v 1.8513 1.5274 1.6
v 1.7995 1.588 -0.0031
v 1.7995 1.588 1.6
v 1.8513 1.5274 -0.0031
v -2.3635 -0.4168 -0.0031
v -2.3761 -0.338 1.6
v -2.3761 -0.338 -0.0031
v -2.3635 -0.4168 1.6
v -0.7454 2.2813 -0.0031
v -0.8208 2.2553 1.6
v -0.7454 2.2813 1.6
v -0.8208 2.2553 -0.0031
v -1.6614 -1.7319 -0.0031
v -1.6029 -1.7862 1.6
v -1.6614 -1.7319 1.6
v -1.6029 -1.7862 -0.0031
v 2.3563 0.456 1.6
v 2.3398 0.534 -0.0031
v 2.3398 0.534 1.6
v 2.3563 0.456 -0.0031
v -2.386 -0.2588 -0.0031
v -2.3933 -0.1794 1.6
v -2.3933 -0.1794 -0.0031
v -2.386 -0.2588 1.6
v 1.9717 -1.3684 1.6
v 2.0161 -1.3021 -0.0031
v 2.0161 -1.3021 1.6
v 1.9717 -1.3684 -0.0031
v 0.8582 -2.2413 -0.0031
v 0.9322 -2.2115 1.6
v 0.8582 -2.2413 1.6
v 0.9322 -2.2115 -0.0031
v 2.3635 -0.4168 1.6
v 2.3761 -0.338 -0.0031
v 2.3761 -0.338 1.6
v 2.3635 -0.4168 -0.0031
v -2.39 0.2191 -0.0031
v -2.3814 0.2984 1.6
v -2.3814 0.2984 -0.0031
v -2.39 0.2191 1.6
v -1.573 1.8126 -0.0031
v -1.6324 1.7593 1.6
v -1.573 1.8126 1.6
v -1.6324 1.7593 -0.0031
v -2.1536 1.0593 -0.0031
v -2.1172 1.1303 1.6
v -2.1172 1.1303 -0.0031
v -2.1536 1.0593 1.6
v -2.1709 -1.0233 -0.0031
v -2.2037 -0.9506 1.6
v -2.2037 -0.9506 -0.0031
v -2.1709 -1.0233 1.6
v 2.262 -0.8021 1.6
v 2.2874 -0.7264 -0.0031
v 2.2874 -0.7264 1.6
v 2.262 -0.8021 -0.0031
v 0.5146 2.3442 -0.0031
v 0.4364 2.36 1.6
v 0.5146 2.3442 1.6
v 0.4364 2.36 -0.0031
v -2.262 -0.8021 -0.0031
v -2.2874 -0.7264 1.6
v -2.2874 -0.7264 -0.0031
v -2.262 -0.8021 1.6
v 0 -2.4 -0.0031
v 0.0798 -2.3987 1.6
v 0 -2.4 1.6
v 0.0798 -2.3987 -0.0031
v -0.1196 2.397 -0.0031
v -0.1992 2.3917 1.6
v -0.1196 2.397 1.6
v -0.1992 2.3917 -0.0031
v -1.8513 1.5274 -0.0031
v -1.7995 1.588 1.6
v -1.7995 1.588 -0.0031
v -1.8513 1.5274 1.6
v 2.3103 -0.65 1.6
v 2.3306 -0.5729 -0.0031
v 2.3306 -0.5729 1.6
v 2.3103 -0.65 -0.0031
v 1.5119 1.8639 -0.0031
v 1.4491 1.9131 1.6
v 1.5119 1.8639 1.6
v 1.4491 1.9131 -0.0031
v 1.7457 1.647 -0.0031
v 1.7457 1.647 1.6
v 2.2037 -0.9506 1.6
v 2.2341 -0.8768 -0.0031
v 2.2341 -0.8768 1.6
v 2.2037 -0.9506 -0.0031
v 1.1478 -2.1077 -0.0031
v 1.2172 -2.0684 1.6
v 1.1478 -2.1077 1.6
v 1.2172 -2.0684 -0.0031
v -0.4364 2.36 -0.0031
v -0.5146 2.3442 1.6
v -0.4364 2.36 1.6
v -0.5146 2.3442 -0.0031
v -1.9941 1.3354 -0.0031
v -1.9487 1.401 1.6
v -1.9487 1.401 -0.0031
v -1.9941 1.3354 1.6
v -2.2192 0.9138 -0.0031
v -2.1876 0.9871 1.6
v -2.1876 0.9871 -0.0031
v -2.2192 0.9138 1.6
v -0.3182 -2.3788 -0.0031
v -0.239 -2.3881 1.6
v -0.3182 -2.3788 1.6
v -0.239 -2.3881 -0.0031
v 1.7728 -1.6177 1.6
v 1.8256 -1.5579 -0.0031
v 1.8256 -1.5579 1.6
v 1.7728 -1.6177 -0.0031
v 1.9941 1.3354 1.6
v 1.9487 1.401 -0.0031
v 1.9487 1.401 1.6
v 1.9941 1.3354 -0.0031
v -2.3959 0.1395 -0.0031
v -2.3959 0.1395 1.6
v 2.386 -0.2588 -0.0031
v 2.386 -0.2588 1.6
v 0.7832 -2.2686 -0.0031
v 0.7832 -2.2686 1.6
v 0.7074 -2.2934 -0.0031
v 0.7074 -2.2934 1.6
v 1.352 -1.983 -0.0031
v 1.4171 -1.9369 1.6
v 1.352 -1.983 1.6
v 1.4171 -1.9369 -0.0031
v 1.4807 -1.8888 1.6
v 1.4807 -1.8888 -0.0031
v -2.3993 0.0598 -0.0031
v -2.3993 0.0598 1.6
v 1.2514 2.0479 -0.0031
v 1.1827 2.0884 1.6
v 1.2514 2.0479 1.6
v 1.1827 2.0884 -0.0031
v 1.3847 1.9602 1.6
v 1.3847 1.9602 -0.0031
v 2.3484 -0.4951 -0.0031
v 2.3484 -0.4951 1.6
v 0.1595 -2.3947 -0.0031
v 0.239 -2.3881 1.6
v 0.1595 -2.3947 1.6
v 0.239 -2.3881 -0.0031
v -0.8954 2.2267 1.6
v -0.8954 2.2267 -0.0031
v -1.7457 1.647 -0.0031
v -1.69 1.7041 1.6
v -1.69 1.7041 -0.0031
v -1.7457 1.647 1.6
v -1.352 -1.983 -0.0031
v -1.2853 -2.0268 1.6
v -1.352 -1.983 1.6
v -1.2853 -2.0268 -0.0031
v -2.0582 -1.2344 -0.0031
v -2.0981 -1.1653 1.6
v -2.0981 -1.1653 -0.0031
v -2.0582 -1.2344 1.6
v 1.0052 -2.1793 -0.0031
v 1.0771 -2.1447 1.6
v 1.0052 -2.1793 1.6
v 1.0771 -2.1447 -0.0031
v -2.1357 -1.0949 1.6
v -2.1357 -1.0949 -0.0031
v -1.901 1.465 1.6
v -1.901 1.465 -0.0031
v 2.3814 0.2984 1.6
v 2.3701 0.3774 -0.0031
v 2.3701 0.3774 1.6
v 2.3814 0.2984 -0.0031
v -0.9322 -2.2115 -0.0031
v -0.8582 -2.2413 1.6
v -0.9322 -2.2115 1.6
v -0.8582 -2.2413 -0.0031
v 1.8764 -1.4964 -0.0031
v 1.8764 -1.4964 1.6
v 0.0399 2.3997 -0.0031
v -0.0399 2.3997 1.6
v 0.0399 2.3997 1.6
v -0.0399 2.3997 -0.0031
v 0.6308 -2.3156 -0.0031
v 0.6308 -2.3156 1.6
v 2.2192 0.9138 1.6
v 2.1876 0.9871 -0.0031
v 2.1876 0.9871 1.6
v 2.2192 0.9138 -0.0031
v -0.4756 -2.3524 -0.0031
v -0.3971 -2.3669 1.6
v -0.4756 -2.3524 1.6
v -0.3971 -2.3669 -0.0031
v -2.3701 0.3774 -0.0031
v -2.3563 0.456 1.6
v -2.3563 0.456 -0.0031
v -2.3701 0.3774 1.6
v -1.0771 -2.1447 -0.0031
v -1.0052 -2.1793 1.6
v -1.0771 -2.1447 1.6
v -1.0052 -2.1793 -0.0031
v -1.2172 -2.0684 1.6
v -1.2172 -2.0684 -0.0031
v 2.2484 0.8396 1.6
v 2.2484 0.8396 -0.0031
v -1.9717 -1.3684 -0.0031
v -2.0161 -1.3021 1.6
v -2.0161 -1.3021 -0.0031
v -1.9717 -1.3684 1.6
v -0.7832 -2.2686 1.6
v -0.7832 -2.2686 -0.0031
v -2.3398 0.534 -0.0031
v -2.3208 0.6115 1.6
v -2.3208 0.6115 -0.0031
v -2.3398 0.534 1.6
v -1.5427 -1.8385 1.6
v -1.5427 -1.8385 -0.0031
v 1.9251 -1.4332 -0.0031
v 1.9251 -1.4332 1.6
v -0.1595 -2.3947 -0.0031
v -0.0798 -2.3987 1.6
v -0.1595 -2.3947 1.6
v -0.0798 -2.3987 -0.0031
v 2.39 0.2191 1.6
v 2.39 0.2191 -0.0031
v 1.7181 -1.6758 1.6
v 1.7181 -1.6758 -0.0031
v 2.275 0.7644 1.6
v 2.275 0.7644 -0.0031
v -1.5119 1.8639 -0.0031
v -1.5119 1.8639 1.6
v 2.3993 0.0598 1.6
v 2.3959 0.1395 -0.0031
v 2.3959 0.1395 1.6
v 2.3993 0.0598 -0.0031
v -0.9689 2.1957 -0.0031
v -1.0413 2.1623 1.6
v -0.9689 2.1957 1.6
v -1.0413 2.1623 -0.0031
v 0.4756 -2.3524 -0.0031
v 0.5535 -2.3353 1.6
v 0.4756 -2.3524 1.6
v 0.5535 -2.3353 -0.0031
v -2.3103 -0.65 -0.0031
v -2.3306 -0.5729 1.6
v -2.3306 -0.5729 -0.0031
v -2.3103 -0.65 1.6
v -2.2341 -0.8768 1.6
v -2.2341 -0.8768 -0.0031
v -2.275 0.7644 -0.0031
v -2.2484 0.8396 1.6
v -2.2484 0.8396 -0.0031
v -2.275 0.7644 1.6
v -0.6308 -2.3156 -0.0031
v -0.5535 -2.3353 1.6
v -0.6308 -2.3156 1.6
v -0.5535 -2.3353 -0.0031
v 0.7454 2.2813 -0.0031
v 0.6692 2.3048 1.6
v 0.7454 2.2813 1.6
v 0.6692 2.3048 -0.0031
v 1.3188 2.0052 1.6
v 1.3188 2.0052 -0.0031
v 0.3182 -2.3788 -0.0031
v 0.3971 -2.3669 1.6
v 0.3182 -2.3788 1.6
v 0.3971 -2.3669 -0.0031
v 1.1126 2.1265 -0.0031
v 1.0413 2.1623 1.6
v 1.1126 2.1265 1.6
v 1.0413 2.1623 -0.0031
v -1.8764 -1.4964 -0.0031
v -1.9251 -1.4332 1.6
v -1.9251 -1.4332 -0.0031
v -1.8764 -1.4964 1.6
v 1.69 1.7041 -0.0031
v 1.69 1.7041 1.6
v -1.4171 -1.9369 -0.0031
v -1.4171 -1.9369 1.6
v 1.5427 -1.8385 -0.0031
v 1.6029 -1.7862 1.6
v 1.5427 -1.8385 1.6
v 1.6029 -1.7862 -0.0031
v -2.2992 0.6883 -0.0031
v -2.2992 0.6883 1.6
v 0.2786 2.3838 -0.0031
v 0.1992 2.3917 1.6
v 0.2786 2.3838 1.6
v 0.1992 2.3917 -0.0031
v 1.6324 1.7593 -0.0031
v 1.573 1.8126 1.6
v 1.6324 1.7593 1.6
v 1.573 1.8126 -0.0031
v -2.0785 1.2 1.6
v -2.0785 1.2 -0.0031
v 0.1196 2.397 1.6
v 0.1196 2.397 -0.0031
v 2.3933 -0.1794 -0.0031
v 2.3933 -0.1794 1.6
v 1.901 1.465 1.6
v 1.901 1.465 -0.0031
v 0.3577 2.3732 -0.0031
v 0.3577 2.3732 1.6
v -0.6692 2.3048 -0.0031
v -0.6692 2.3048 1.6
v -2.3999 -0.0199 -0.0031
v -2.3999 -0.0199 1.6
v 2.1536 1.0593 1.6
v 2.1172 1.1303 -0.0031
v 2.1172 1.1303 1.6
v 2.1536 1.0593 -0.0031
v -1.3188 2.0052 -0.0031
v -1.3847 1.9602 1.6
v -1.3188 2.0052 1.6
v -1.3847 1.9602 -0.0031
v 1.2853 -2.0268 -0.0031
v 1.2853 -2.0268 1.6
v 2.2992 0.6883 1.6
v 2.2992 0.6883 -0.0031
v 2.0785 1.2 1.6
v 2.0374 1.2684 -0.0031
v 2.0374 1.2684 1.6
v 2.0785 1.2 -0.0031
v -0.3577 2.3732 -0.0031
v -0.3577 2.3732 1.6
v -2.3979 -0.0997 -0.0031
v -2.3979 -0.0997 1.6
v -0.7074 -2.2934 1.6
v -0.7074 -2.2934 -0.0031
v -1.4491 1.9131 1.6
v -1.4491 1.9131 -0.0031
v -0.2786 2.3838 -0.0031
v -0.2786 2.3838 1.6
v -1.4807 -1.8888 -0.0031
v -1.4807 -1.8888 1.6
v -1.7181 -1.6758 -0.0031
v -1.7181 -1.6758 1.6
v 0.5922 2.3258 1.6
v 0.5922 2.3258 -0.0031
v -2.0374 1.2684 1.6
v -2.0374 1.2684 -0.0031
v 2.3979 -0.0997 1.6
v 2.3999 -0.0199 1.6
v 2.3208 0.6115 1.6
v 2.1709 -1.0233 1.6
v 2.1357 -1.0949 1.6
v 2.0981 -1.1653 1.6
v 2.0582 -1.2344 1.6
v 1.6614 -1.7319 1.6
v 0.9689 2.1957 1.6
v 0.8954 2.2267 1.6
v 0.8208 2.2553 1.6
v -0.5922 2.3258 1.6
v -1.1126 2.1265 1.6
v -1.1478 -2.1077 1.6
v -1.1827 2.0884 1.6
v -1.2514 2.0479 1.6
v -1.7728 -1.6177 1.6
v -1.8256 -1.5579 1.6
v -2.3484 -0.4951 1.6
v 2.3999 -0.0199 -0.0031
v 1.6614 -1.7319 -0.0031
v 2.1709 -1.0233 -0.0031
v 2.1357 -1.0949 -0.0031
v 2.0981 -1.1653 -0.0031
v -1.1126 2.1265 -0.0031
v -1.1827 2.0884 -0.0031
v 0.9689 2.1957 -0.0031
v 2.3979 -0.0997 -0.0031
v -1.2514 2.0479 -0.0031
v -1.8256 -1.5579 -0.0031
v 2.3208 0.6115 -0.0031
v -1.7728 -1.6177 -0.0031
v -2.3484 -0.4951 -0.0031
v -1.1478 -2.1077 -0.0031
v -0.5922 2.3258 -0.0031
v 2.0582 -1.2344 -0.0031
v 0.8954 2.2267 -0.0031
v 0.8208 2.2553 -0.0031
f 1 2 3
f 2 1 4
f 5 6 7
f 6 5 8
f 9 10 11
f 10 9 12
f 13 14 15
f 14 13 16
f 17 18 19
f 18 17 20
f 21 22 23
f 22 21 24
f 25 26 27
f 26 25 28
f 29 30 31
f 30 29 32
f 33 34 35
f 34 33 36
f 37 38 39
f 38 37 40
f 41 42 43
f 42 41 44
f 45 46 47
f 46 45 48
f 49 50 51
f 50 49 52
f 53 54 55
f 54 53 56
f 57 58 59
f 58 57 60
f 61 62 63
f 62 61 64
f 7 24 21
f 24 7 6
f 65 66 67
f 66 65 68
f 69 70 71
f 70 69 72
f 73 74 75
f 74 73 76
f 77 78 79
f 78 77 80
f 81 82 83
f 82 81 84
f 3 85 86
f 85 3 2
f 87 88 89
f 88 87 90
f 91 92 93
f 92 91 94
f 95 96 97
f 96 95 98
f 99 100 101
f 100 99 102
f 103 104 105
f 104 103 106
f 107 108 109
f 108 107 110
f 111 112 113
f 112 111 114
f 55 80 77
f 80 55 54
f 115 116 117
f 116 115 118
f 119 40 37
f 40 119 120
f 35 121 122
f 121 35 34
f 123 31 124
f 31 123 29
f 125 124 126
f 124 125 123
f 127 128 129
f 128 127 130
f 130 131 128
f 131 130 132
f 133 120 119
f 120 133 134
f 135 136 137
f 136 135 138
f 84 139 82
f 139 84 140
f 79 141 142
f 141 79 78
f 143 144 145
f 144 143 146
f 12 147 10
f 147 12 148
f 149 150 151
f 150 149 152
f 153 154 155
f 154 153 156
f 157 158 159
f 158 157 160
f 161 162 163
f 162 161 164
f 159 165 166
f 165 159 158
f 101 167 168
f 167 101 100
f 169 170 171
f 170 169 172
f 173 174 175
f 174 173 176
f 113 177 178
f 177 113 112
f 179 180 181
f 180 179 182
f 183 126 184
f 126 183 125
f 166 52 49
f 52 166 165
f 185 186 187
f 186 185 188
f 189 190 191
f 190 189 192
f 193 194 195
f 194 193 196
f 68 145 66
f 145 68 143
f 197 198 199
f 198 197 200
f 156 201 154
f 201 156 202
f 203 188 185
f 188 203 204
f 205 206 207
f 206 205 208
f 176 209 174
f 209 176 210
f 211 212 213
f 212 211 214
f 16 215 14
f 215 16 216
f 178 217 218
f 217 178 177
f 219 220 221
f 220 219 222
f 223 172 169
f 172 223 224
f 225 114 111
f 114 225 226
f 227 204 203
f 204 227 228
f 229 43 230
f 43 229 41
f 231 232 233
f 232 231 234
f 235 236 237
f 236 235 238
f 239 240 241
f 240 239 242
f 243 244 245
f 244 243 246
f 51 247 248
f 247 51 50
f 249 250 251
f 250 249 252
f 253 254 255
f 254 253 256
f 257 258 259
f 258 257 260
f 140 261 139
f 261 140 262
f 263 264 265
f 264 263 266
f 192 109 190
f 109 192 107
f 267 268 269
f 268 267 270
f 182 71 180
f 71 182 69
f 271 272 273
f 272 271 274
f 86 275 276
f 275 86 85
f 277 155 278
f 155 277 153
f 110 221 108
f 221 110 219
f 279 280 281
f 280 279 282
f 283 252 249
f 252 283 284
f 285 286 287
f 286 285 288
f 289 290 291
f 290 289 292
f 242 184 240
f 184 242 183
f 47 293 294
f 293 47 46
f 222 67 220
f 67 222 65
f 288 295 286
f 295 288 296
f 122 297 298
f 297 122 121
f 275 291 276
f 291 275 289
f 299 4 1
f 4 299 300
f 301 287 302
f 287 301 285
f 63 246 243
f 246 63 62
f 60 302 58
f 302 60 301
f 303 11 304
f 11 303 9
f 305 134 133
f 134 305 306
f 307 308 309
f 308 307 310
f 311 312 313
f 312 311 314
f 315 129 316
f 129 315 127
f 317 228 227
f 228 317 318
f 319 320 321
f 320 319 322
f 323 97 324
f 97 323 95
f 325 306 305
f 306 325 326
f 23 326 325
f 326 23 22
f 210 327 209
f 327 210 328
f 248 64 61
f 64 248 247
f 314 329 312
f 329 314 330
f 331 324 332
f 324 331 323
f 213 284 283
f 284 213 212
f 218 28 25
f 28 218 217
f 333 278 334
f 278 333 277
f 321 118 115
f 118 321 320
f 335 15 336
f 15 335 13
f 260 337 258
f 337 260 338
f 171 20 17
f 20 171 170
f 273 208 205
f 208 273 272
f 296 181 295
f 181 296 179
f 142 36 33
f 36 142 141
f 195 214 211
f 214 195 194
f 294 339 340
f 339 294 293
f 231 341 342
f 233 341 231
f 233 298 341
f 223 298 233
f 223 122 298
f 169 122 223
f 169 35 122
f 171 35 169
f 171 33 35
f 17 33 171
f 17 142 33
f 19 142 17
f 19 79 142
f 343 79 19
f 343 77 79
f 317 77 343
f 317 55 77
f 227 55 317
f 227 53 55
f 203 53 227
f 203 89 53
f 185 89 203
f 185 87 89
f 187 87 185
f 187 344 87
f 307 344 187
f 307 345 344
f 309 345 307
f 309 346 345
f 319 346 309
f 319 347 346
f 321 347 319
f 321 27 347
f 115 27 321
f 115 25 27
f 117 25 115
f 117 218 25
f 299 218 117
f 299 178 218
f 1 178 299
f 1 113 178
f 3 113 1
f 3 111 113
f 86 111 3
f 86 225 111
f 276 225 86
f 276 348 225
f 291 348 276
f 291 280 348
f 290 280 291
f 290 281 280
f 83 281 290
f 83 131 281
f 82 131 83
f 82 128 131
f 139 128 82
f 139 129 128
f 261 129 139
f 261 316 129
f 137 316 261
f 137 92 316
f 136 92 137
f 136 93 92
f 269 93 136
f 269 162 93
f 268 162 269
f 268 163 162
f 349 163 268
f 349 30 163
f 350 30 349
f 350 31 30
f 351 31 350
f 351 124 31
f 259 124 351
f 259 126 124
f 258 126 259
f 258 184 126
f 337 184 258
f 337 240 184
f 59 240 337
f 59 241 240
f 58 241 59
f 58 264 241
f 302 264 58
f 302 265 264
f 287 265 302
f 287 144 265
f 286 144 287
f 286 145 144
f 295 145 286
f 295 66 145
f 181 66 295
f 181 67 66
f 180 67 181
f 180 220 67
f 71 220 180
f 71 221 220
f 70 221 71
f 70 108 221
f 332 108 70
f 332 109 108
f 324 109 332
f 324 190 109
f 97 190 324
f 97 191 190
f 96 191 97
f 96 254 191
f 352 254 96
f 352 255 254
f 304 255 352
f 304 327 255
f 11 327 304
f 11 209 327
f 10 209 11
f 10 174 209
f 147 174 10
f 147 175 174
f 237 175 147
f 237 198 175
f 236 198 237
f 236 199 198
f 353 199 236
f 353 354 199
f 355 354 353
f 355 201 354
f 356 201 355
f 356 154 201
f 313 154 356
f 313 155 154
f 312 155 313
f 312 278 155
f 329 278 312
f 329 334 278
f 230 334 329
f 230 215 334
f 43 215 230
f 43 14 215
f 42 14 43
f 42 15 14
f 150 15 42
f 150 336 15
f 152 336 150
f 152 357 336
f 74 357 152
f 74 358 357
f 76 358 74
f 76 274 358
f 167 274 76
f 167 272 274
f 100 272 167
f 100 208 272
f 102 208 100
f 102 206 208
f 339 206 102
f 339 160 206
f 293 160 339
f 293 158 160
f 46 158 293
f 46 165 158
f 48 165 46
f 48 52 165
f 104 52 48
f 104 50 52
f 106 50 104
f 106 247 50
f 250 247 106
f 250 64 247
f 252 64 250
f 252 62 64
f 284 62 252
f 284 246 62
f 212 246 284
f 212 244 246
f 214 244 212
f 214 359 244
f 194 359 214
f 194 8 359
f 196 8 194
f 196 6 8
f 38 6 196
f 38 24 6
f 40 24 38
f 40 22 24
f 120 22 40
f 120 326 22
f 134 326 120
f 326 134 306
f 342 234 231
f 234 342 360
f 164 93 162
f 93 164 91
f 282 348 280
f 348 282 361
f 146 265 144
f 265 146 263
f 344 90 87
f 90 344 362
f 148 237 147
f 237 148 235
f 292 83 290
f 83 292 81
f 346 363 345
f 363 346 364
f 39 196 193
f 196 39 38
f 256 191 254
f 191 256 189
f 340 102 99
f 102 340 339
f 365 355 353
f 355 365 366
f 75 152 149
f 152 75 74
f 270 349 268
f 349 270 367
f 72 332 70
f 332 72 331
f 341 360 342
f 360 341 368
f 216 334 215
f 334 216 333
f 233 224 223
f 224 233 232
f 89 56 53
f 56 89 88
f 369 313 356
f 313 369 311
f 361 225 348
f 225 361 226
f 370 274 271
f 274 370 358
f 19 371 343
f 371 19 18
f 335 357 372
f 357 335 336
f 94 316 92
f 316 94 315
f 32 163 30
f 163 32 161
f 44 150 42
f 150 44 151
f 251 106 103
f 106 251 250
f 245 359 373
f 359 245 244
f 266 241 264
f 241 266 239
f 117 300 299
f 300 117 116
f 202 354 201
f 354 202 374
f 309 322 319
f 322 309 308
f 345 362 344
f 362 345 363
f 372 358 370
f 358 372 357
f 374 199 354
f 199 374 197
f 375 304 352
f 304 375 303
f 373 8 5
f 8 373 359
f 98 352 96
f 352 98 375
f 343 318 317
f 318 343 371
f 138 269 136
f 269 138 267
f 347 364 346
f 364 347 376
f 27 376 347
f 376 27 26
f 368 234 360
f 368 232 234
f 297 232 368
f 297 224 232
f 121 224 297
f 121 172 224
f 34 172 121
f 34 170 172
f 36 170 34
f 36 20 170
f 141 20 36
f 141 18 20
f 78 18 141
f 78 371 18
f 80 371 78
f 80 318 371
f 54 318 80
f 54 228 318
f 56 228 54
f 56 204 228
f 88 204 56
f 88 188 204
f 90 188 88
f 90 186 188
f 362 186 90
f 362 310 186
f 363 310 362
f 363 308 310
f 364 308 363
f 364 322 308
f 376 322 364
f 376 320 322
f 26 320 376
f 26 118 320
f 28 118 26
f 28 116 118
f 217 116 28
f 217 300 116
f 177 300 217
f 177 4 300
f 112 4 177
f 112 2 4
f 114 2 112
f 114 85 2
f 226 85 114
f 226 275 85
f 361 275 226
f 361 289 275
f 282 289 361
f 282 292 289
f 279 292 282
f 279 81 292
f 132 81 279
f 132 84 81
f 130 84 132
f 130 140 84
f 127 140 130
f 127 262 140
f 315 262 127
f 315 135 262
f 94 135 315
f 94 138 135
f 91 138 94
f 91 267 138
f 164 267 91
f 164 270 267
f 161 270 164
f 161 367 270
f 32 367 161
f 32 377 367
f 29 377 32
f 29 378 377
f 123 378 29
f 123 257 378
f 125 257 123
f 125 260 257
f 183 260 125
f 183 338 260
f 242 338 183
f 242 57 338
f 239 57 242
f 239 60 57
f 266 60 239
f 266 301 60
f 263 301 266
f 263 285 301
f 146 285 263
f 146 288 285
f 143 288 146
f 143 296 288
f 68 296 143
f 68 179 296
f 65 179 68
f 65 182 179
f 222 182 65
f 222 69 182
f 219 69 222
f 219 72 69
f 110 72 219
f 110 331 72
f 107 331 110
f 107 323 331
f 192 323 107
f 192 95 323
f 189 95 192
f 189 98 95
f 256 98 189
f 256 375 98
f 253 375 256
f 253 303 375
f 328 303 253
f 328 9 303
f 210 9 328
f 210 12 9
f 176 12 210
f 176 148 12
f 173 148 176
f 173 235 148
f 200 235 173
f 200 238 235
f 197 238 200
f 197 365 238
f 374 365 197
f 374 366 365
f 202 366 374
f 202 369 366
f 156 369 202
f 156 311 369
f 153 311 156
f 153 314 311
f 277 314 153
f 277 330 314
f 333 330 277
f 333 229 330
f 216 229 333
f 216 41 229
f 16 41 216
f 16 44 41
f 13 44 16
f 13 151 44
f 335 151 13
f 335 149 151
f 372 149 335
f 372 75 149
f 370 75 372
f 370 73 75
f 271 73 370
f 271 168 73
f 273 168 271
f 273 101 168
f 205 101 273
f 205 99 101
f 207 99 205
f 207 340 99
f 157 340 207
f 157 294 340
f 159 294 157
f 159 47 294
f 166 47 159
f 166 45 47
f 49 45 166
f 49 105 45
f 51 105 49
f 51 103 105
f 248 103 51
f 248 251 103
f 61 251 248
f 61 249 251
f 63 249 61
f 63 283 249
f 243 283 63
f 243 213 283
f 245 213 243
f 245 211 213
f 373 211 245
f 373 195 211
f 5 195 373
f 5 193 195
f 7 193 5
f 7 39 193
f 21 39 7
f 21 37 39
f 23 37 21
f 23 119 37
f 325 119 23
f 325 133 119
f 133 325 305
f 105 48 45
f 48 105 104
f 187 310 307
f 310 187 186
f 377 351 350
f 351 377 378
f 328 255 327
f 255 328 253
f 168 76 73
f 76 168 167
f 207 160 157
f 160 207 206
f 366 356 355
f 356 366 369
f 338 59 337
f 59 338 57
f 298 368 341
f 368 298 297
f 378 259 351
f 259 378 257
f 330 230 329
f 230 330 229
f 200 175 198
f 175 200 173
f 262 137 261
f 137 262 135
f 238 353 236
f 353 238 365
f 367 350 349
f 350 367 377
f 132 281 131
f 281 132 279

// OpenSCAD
use <../lib.scad>
use <s/3040s01.scad>
$fa=1; $fs=0.2;
function ldraw_lib__3040p32(realsolid=false) = [
// 0 Slope Brick 45  2 x  1 with 9 + 3 Black Buttons Pattern
// 0 Name: 3040p32.dat
// 0 Author: Bram Lambrecht
// 0 !LDRAW_ORG Part UPDATE 2004-01
// 0 !LICENSE Licensed under CC BY 2.0 and CC BY 4.0 : see CAreadme.txt
// 
// 0 BFC CERTIFY CCW
  [0,"BFC","CERTIFY"],
  [0,"BFC","CCW"],
// 
// 0 !HISTORY 1999-02-01 [PTadmin] Official Update 1999-01
// 0 !HISTORY 2000-05-07 [PTadmin] Official Update 2000-01
// 0 !HISTORY 2000-09-30 [PTadmin] Official Update 2000-02
// 0 !HISTORY 2002-09-13 [izanette] Modified with WINDZ for BFC compliance
// 0 !HISTORY 2004-03-02 [PTadmin] Official Update 2004-01
// 0 !HISTORY 2007-06-09 [PTadmin] Header formatted for Contributor Agreement
// 0 !HISTORY 2008-07-01 [PTadmin] Official Update 2008-01
// 
// 
// 1 16 0 0 0 1 0 0 0 1 0 0 0 1 s\3040s01.dat
  [1,16,0,0,0,1,0,0,0,1,0,0,0,1, ldraw_lib__s__3040s01(realsolid)],
// 
// 4 0 -8 2.86 -12.86 -8 5.71 -15.71 -4 5.71 -15.71 -4 2.86 -12.86
  [4,0,-8,2.86,-12.86,-8,5.71,-15.71,-4,5.71,-15.71,-4,2.86,-12.86],
// 4 0 -2 2.86 -12.86 -2 5.71 -15.71 2 5.71 -15.71 2 2.86 -12.86
  [4,0,-2,2.86,-12.86,-2,5.71,-15.71,2,5.71,-15.71,2,2.86,-12.86],
// 4 0 4 2.86 -12.86 4 5.71 -15.71 8 5.71 -15.71 8 2.86 -12.86
  [4,0,4,2.86,-12.86,4,5.71,-15.71,8,5.71,-15.71,8,2.86,-12.86],
// 4 0 -8 7.14 -17.14 -8 10.00 -20.00 -4 10.00 -20.00 -4 7.14 -17.14
  [4,0,-8,7.14,-17.14,-8,10.00,-20.00,-4,10.00,-20.00,-4,7.14,-17.14],
// 4 0 -2 7.14 -17.14 -2 10.00 -20.00 2 10.00 -20.00 2 7.14 -17.14
  [4,0,-2,7.14,-17.14,-2,10.00,-20.00,2,10.00,-20.00,2,7.14,-17.14],
// 4 0 4 7.14 -17.14 4 10.00 -20.00 8 10.00 -20.00 8 7.14 -17.14
  [4,0,4,7.14,-17.14,4,10.00,-20.00,8,10.00,-20.00,8,7.14,-17.14],
// 4 0 -8 11.43 -21.43 -8 14.29 -24.29 -4 14.29 -24.29 -4 11.43 -21.43
  [4,0,-8,11.43,-21.43,-8,14.29,-24.29,-4,14.29,-24.29,-4,11.43,-21.43],
// 4 0 -2 11.43 -21.43 -2 14.29 -24.29 2 14.29 -24.29 2 11.43 -21.43
  [4,0,-2,11.43,-21.43,-2,14.29,-24.29,2,14.29,-24.29,2,11.43,-21.43],
// 4 0 4 11.43 -21.43 4 14.29 -24.29 8 14.29 -24.29 8 11.43 -21.43
  [4,0,4,11.43,-21.43,4,14.29,-24.29,8,14.29,-24.29,8,11.43,-21.43],
// 4 0 -8 16.43 -26.43 -8 17.86 -27.86 -4 17.86 -27.86 -4 16.43 -26.43
  [4,0,-8,16.43,-26.43,-8,17.86,-27.86,-4,17.86,-27.86,-4,16.43,-26.43],
// 4 0 -2 16.43 -26.43 -2 17.86 -27.86 2 17.86 -27.86 2 16.43 -26.43
  [4,0,-2,16.43,-26.43,-2,17.86,-27.86,2,17.86,-27.86,2,16.43,-26.43],
// 4 0 4 16.43 -26.43 4 17.86 -27.86 8 17.86 -27.86 8 16.43 -26.43
  [4,0,4,16.43,-26.43,4,17.86,-27.86,8,17.86,-27.86,8,16.43,-26.43],
// 4 16 -10 0 -10 -8 2.86 -12.86 8 2.86 -12.86 10 0 -10
  [4,16,-10,0,-10,-8,2.86,-12.86,8,2.86,-12.86,10,0,-10],
// 4 16 10 0 -10 8 2.86 -12.86 8 17.86 -27.86 10 20.00 -30.00
  [4,16,10,0,-10,8,2.86,-12.86,8,17.86,-27.86,10,20.00,-30.00],
// 4 16 10 20.00 -30.00 8 17.86 -27.86 -8 17.86 -27.86 -10 20.00 -30.00
  [4,16,10,20.00,-30.00,8,17.86,-27.86,-8,17.86,-27.86,-10,20.00,-30.00],
// 4 16 -10 20.00 -30.00 -8 17.86 -27.86 -8 2.86 -12.86 -10 0 -10
  [4,16,-10,20.00,-30.00,-8,17.86,-27.86,-8,2.86,-12.86,-10,0,-10],
// 4 16 -8 5.71 -15.71 -8 7.14 -17.14 8 7.14 -17.14 8 5.71 -15.71
  [4,16,-8,5.71,-15.71,-8,7.14,-17.14,8,7.14,-17.14,8,5.71,-15.71],
// 4 16 -8 10.00 -20.00 -8 11.43 -21.43 8 11.43 -21.43 8 10.00 -20.00
  [4,16,-8,10.00,-20.00,-8,11.43,-21.43,8,11.43,-21.43,8,10.00,-20.00],
// 4 16 -8 14.29 -24.29 -8 16.43 -26.43 8 16.43 -26.43 8 14.29 -24.29
  [4,16,-8,14.29,-24.29,-8,16.43,-26.43,8,16.43,-26.43,8,14.29,-24.29],
// 4 16 -4 2.86 -12.86 -4 17.86 -27.86 -2 17.86 -27.86 -2 2.86 -12.86
  [4,16,-4,2.86,-12.86,-4,17.86,-27.86,-2,17.86,-27.86,-2,2.86,-12.86],
// 4 16 2 2.86 -12.86 2 17.86 -27.86 4 17.86 -27.86 4 2.86 -12.86
  [4,16,2,2.86,-12.86,2,17.86,-27.86,4,17.86,-27.86,4,2.86,-12.86],
];
module ldraw_lib__3040p32(step=0, col=false, unit=2/5, alt=false, line=0.2, solid=!$preview)
    makepoly(ldraw_lib__3040p32(solid), step=step, col=col, unit=unit, alt=alt, line=line, solid=solid);
ldraw_lib__3040p32(line=0.2);
